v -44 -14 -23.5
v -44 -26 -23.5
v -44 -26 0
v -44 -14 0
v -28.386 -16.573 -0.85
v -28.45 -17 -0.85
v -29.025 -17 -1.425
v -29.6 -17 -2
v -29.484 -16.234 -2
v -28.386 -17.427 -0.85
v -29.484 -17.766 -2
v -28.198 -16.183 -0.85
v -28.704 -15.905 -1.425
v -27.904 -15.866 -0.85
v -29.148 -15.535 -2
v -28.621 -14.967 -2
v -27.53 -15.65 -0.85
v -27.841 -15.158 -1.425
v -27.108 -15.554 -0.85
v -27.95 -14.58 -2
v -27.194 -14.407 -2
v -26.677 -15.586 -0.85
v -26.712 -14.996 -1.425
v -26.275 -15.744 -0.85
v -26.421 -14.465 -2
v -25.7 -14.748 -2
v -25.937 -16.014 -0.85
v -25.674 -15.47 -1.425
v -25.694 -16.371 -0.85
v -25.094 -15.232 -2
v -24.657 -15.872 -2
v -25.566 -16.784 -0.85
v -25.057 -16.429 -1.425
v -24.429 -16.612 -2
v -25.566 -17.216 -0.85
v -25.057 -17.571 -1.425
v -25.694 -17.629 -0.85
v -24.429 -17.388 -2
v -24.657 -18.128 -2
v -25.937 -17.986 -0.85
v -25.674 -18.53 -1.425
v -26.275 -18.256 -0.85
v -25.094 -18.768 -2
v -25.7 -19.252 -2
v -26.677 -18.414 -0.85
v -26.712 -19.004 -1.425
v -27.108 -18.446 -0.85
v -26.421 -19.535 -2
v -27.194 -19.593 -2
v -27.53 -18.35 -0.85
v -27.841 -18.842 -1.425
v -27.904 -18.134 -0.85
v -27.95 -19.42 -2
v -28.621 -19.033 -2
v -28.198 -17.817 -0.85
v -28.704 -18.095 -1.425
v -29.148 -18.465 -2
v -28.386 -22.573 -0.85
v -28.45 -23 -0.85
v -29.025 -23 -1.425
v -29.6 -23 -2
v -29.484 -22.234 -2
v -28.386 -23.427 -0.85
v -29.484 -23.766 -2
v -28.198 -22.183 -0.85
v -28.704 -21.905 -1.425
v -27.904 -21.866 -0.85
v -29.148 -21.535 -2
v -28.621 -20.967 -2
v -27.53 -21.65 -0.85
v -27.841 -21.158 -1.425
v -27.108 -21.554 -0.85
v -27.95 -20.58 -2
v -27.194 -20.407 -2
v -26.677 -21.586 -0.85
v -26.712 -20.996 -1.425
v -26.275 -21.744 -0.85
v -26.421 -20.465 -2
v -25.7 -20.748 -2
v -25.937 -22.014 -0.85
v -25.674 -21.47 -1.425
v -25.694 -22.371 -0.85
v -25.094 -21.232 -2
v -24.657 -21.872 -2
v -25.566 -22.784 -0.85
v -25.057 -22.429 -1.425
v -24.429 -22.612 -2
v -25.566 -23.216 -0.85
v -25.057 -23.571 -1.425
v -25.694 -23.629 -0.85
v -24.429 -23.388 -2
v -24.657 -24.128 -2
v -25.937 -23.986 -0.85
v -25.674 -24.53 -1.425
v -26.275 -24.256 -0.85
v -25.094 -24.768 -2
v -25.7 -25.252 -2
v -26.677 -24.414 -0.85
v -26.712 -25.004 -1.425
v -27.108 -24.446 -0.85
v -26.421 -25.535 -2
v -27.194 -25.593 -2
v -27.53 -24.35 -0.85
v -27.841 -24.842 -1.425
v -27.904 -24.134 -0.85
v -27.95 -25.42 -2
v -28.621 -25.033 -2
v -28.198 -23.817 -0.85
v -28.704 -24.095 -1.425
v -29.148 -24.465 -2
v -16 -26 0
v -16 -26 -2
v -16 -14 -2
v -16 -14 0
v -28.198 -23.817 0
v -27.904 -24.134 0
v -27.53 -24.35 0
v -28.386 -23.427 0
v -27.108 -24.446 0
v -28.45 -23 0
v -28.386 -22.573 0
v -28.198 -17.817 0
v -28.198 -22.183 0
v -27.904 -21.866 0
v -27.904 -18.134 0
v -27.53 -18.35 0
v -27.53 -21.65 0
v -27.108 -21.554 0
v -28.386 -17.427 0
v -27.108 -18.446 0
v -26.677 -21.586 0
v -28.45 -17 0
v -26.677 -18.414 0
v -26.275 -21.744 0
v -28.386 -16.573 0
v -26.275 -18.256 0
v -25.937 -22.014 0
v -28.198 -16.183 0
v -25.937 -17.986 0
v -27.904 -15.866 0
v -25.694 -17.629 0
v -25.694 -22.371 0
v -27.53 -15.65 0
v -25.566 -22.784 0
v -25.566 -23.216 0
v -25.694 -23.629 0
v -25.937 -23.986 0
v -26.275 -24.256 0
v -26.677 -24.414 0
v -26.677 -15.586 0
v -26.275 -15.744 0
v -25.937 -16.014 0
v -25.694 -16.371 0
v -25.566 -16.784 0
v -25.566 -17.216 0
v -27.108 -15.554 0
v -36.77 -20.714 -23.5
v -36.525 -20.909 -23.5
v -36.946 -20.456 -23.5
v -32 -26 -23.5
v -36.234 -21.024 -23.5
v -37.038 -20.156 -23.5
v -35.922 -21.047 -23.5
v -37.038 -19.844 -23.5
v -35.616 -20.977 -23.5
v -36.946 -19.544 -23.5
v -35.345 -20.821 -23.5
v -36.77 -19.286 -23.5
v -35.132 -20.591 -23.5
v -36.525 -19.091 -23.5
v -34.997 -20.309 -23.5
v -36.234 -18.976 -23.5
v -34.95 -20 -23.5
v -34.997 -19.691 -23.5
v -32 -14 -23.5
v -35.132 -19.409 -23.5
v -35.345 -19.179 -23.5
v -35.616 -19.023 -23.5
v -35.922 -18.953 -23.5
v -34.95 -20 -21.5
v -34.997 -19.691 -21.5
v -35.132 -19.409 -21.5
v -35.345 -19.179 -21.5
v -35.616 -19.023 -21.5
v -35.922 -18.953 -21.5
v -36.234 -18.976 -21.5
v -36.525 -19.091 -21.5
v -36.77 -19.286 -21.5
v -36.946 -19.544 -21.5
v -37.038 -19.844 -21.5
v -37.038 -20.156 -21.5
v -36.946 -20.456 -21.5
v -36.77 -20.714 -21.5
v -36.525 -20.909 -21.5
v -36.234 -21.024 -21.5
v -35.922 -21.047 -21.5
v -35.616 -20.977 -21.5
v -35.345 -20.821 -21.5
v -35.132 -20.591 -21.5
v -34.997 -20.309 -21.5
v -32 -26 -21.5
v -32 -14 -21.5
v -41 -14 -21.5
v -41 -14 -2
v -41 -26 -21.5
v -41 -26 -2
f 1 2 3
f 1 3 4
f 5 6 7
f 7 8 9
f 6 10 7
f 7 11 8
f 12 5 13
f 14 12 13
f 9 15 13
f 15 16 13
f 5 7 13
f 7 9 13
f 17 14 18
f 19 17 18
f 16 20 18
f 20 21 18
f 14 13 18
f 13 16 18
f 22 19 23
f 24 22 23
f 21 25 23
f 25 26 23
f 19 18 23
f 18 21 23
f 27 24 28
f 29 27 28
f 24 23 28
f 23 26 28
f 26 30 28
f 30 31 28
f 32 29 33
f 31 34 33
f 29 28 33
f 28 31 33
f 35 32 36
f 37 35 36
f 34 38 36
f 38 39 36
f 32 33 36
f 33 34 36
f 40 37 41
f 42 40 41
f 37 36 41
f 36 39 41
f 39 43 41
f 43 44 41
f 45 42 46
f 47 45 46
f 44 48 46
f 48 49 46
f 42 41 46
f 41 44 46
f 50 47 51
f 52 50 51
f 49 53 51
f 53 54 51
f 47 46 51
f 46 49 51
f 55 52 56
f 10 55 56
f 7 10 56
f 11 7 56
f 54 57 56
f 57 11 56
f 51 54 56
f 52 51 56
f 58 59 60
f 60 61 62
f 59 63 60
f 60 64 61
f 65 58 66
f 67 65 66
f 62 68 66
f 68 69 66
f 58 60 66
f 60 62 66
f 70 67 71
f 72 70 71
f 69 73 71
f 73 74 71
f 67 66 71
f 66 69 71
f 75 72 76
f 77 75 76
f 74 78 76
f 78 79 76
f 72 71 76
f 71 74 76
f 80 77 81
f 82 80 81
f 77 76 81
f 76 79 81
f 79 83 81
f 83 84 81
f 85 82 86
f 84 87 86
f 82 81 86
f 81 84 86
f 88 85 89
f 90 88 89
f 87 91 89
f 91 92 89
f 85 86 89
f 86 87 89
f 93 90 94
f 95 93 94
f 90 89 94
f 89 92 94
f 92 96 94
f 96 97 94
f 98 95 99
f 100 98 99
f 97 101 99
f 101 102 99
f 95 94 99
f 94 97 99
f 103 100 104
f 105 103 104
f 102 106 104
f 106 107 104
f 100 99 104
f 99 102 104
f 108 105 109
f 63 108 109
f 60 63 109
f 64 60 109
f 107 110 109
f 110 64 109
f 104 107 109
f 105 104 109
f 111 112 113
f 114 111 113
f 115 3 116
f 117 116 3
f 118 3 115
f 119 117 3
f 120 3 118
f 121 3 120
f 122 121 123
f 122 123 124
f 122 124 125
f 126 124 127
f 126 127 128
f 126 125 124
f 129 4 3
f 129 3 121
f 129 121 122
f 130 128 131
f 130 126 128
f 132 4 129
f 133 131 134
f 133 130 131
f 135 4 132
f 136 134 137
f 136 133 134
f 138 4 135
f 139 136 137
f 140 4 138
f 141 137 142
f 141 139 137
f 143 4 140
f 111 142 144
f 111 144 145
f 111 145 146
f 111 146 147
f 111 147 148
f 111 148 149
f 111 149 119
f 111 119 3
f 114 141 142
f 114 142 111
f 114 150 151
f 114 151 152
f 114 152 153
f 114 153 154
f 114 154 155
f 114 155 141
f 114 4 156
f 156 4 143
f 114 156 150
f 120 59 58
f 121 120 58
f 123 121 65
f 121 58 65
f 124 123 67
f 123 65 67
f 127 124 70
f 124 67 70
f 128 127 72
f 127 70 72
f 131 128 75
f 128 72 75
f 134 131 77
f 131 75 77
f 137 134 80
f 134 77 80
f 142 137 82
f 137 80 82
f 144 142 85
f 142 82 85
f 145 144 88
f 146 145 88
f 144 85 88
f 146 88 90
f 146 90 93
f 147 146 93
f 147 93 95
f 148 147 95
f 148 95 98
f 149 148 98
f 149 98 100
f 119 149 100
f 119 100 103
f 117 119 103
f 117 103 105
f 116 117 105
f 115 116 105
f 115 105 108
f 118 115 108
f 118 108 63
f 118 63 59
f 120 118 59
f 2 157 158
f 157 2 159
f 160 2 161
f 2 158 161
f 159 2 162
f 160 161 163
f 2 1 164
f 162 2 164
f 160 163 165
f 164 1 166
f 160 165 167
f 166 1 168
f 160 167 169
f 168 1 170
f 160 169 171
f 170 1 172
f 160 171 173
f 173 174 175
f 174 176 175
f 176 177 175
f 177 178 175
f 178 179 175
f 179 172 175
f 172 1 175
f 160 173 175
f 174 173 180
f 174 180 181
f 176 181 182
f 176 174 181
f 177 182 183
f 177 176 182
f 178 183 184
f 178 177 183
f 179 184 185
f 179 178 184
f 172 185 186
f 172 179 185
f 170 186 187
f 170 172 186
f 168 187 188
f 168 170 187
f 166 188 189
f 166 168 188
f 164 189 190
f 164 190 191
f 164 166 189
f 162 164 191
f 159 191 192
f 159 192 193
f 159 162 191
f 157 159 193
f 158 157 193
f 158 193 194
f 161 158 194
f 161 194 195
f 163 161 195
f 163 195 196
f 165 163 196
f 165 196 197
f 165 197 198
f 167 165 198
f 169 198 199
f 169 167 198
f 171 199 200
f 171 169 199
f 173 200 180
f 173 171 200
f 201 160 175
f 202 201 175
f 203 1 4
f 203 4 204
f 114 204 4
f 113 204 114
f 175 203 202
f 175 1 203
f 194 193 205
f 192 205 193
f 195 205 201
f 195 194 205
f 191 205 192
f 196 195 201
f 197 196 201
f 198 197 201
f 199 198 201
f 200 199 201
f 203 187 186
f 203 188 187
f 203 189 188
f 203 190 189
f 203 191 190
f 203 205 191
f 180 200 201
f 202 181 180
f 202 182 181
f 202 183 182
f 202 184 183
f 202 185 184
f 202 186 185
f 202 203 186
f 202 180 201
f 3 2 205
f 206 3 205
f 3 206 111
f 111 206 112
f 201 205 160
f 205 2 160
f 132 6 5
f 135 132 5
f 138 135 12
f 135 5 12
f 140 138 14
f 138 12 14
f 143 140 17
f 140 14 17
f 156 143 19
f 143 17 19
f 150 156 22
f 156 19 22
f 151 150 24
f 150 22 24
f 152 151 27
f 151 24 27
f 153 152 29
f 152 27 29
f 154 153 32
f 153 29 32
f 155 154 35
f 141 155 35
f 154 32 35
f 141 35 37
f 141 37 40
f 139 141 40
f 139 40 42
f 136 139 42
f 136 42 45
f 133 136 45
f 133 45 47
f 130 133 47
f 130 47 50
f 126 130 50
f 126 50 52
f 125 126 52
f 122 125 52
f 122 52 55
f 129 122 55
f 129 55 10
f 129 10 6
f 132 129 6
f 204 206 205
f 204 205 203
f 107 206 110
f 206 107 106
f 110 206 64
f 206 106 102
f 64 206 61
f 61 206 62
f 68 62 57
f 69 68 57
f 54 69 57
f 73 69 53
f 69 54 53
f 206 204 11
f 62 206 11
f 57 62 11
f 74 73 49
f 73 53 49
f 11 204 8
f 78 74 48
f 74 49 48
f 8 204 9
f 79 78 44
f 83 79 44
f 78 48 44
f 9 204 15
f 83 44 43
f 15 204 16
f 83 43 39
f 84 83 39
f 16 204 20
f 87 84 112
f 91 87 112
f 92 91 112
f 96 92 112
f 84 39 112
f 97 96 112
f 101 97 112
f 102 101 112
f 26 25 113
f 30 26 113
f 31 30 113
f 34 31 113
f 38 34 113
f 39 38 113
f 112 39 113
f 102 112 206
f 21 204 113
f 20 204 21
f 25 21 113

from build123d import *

# Parameters (mm, degrees)
LINK_EYE_SHELF_START          = -23.5
SKETCH1_W                     = 12
SKETCH1_H                     = 12
SKETCH1_R                     = 1.05
LINK_EYE_SHELF_DEPTH          = 2
OUTBOARD_WEB_START            = -22.5
SKETCH2_W                     = 3
SKETCH2_H                     = 12
OUTBOARD_WEB_DEPTH            = 21.5
CARRIAGE_PLATE_FOOT_START     = -2
SKETCH3_W                     = 28
SKETCH3_H                     = 12
CARRIAGE_PLATE_FOOT_DEPTH     = 2
SKETCH6_R                     = 1.45
YTAB_D2P9_DEPTH               = 2.01
SKETCH7_R                     = 2.6
YTAB_CSK_D5P2_DEPTH           = 1.15
YTAB_CSK_D5P2_DRAFT           = -45
YTAB_CSK_D5P2_PROFILE_2_DEPTH = 1.15
YTAB_CSK_D5P2_PROFILE_2_DRAFT = -45


with BuildPart() as part:
    # Sketch1 → Link_Eye_Shelf (new body)
    with BuildSketch(Plane.XY.offset(LINK_EYE_SHELF_START)):
        with Locations((-38, -20)):
            Rectangle(SKETCH1_W, SKETCH1_H)
        with Locations((-36, -20)):
            Circle(SKETCH1_R, mode=Mode.SUBTRACT)
    extrude(amount=LINK_EYE_SHELF_DEPTH)

    # Sketch2 → Outboard_Web (add)
    with BuildSketch(Plane.XY.offset(OUTBOARD_WEB_START)):
        with Locations((-42.5, -20)):
            Rectangle(SKETCH2_W, SKETCH2_H)
    extrude(amount=OUTBOARD_WEB_DEPTH)

    # Sketch3 → Carriage_Plate_Foot (add)
    with BuildSketch(Plane.XY.offset(CARRIAGE_PLATE_FOOT_START)):
        with Locations((-30, -20)):
            Rectangle(SKETCH3_W, SKETCH3_H)
    extrude(amount=CARRIAGE_PLATE_FOOT_DEPTH)

    # Sketch6 → YTab_D2p9 (cut)
    with BuildSketch(Plane(origin=(0, 0, -2), x_dir=(-1, 0, 0), z_dir=(0, 0, -1))):
        with Locations((27, -23)):
            Circle(SKETCH6_R)
        with Locations((27, -17)):
            Circle(SKETCH6_R)
    extrude(amount=-YTAB_D2P9_DEPTH, mode=Mode.SUBTRACT)


with BuildPart() as ytab_csk_d5p2_tool:
    # Sketch7 → YTab_CSK_D5p2 (with draft: the straight prism first)
    with BuildSketch(Plane(origin=(0, 0, -2), x_dir=(-1, 0, 0), z_dir=(0, 0, -1))):
        with Locations((27, -23)):
            Circle(SKETCH7_R)
    extrude(amount=-YTAB_CSK_D5P2_DEPTH)
    # YTab_CSK_D5p2: the draft: its side faces are tilted about the plane it starts from
    ytab_csk_d5p2_sides = [ytab_csk_d5p2_tool.faces().sort_by_distance(p)[0] for p in [
        (-24.4, -23, -1.425),
    ]]
    draft(ytab_csk_d5p2_sides, Plane(origin=(0, 0, -2), x_dir=(-1, 0, 0), z_dir=(0, 0, -1)), YTAB_CSK_D5P2_DRAFT)


with BuildPart() as part_1:
    add(part.part)

    # YTab_CSK_D5p2: cut by ytab_csk_d5p2_tool
    add(ytab_csk_d5p2_tool.part, mode=Mode.SUBTRACT)


with BuildPart() as ytab_csk_d5p2_profile_2_tool:
    # Sketch7 → YTab_CSK_D5p2 profile 2 (with draft: the straight prism first)
    with BuildSketch(Plane(origin=(0, 0, -2), x_dir=(-1, 0, 0), z_dir=(0, 0, -1))):
        with Locations((27, -17)):
            Circle(SKETCH7_R)
    extrude(amount=-YTAB_CSK_D5P2_PROFILE_2_DEPTH)
    # YTab_CSK_D5p2 profile 2: the draft: its side faces are tilted about the plane it starts from
    ytab_csk_d5p2_profile_2_sides = [ytab_csk_d5p2_profile_2_tool.faces().sort_by_distance(p)[0] for p in [
        (-24.4, -17, -1.425),
    ]]
    draft(ytab_csk_d5p2_profile_2_sides, Plane(origin=(0, 0, -2), x_dir=(-1, 0, 0), z_dir=(0, 0, -1)), YTAB_CSK_D5P2_PROFILE_2_DRAFT)


with BuildPart() as part_2:
    add(part_1.part)

    # YTab_CSK_D5p2 profile 2: cut by ytab_csk_d5p2_profile_2_tool
    add(ytab_csk_d5p2_profile_2_tool.part, mode=Mode.SUBTRACT)


solid = part_2.part
